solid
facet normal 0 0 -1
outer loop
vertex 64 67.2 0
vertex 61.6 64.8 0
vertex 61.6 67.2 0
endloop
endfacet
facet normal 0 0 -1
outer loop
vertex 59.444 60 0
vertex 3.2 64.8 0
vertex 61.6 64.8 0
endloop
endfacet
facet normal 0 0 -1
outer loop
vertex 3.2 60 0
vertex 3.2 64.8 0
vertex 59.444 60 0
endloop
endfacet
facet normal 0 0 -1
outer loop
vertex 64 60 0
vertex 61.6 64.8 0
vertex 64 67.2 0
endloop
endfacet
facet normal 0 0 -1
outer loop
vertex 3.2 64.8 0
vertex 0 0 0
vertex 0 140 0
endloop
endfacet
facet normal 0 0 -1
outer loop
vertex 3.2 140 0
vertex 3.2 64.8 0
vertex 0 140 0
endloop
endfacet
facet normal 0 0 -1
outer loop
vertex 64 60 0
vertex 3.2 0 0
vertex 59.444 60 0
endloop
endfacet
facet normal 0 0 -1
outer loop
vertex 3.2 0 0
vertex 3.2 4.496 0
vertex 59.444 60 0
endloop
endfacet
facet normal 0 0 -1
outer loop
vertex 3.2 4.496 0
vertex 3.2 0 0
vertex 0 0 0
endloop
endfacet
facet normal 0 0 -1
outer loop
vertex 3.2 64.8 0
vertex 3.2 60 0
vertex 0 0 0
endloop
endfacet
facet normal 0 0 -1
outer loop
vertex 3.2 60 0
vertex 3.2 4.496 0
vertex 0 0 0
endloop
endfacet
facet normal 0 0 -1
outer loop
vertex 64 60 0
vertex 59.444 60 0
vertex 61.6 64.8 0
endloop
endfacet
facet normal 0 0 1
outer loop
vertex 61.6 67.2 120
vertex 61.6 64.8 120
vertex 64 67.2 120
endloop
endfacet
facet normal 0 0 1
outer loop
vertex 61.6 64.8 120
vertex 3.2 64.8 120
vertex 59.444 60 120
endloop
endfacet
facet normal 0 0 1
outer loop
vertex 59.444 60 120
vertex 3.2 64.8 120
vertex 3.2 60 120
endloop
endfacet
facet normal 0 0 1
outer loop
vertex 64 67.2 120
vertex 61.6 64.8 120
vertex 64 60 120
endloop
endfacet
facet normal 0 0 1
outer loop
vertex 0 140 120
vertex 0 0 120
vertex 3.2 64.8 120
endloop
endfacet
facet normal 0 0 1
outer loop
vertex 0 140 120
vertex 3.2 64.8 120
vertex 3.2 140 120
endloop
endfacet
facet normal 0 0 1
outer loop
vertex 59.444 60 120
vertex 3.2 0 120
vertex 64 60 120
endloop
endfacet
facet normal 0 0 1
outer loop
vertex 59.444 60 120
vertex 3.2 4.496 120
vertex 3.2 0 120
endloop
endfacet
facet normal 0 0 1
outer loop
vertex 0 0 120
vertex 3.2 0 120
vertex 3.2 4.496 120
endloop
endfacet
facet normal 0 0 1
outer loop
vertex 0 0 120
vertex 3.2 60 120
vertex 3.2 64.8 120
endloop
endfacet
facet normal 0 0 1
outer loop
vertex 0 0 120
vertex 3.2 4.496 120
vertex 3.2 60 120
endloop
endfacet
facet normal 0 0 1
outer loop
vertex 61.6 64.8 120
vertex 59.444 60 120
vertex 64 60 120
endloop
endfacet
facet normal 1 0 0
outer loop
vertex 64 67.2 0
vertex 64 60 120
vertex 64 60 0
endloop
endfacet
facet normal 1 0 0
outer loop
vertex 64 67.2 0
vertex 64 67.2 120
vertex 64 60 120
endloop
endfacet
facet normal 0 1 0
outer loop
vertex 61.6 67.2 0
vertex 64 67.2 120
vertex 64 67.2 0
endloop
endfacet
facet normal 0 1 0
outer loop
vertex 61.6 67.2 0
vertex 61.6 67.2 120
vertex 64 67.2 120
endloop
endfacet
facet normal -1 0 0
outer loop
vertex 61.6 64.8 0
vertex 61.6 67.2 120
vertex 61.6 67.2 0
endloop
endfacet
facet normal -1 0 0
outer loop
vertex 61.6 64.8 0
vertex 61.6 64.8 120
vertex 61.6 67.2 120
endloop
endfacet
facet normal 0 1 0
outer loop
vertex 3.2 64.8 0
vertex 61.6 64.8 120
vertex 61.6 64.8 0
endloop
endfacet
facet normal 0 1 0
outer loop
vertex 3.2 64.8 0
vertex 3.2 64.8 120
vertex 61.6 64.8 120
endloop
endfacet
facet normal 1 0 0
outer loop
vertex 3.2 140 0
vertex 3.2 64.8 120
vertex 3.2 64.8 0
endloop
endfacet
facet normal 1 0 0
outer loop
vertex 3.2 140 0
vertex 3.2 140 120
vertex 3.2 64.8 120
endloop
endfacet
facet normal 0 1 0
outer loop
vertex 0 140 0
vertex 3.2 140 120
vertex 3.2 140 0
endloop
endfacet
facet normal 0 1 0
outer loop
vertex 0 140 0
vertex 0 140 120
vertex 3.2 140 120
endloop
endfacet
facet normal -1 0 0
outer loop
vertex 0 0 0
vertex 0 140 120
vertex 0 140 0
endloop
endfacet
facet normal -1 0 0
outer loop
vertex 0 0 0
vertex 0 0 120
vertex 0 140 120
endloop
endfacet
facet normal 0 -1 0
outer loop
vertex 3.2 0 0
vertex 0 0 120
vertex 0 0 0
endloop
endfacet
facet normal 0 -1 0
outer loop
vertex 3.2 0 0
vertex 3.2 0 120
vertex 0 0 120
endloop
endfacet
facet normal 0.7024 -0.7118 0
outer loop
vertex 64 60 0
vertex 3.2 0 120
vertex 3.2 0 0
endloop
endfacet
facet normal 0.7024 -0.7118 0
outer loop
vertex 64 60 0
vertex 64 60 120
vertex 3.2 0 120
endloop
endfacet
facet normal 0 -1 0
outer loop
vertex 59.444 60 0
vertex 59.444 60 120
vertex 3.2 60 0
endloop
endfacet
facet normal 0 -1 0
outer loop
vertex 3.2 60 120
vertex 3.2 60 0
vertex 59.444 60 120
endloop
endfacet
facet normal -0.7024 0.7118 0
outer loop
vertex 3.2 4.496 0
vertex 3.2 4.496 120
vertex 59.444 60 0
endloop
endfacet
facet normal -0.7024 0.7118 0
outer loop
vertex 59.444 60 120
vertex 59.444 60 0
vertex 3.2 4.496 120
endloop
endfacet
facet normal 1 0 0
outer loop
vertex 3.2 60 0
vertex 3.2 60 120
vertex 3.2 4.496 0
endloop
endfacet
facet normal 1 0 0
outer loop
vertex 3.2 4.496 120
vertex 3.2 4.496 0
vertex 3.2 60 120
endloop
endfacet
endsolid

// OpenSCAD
// Original prototype geometry. Units: mm. Modules output print orientation.
// Set part to an index below, render F6, then export STL. No structural rating.
part=0;
// Print as supplied, on its side. No supports intended; inspect sliced preview.
module part_01_ledge_core_SIDE_PRINT() { linear_extrude(height=120.0) polygon(points=[[3.2, 140.0], [3.2, 64.8], [61.6, 64.8], [61.6, 67.2], [64.0, 67.2], [64.0, 64.8], [64.0, 64.7], [64.0, 60.0], [3.2, 0.0], [0.0, 0.0], [0.0, 140.0], [3.2, 60.0], [3.2, 4.4958], [59.4442, 60.0]], paths=[[0, 1, 2, 3, 4, 5, 6, 7, 8, 9, 10], [11, 12, 13]]); }
// Print as supplied, on its side. No supports intended; inspect sliced preview.
module part_02_pixel_cubby_core_SIDE_PRINT() { linear_extrude(height=120.0) polygon(points=[[3.2, 64.8], [61.6, 64.8], [61.6, 67.2], [64.0, 67.2], [64.0, 64.8], [64.0, 64.7], [64.0, 60.0], [3.2, 0.0], [0.0, 0.0], [0.0, 175.2], [0.0, 180.0], [3.2, 180.0], [64.0, 180.0], [64.0, 175.2], [3.2, 175.2], [3.2, 4.4958], [59.4442, 60.0], [3.2, 60.0]], paths=[[0, 1, 2, 3, 4, 5, 6, 7, 8, 9, 10, 11, 12, 13, 14], [15, 16, 17]]); }
// Decorative only. Glue overlap to front of backplate; ribs face room.
module part_03_dragon_wing_R_FLAT() { mirror([0,1,0]) {linear_extrude(height=2.4) polygon(points=[[44.0, 42.0], [58.0, 72.0], [80.0, 48.0], [76.0, 93.0], [104.0, 66.0], [94.0, 118.0], [118.0, 95.0], [110.0, 144.0], [90.0, 172.0], [66.0, 186.0], [63.0, 178.0], [68.0, 160.0], [64.0, 144.0], [57.0, 133.0], [44.0, 128.0]], paths=[[0, 1, 2, 3, 4, 5, 6, 7, 8, 9, 10, 11, 12, 13, 14]]);translate([0,0,2.3]) linear_extrude(height=1) union() {polygon(points=[[58.7367, 71.9362], [58.3686, 72.3379], [58.3337, 72.3724], [58.2956, 72.4033], [58.2547, 72.4303], [58.2113, 72.4532], [58.1658, 72.4717], [58.1188, 72.4857], [58.0707, 72.495], [58.0218, 72.4995], [57.9728, 72.4993], [57.924, 72.4942], [57.8759, 72.4844], [57.829, 72.4699], [57.7838, 72.4508], [57.7407, 72.4275], [57.7, 72.4], [57.6623, 72.3687], [57.6278, 72.3338], [57.5969, 72.2958], [57.5698, 72.2548], [57.5469, 72.2114], [57.4697, 72.0459], [56.9041, 72.0948], [62.8959, 141.3337], [64.4218, 143.7316], [64.4481, 143.7783], [64.4693, 143.8275], [64.4851, 143.8787], [65.7687, 149.0134], [59.0959, 71.9052]], paths=[[0, 1, 2, 3, 4, 5, 6, 7, 8, 9, 10, 11, 12, 13, 14, 15, 16, 17, 18, 19, 20, 21, 22, 23, 24, 25, 26, 27, 28, 29, 30]]);polygon(points=[[65.9041, 176.0948], [68.0959, 175.9052], [67.1469, 164.9392], [65.4632, 171.0005]], paths=[[0, 1, 2, 3]]);}translate([0,0,2.3]) linear_extrude(height=1) polygon(points=[[67.8071, 157.1668], [68.4851, 159.8787], [68.495, 159.9293], [68.4996, 159.9807], [68.499, 160.0323], [68.493, 160.0835], [68.4818, 160.1338], [66.9432, 165.6726], [65.9056, 175.8889], [68.0944, 176.1111], [76.5153, 93.1977], [76.3471, 93.3599], [76.3106, 93.3919], [76.2711, 93.4201], [76.2291, 93.4444], [76.185, 93.4645], [76.1391, 93.4803], [76.0919, 93.4915], [76.0438, 93.4981], [75.9953, 93.5], [75.9469, 93.4972], [75.899, 93.4897], [75.852, 93.4776], [75.8064, 93.461], [75.7626, 93.4401], [75.7211, 93.415], [75.6822, 93.386], [75.6463, 93.3534], [75.6137, 93.3174], [75.5848, 93.2785], [75.5597, 93.237], [75.5388, 93.1932], [75.5223, 93.1476], [75.5102, 93.1006], [75.5028, 93.0526], [75.5, 93.0042], [75.502, 92.9557], [79.3713, 49.4258], [78.6721, 50.1886]], paths=[[0, 1, 2, 3, 4, 5, 6, 7, 8, 9, 10, 11, 12, 13, 14, 15, 16, 17, 18, 19, 20, 21, 22, 23, 24, 25, 26, 27, 28, 29, 30, 31, 32, 33, 34, 35, 36, 37, 38]]);translate([0,0,2.3]) linear_extrude(height=1) polygon(points=[[65.9574, 175.6493], [68.0426, 176.3507], [101.2618, 77.5908], [103.2109, 67.4555], [101.9365, 68.6844]], paths=[[0, 1, 2, 3, 4]]);translate([0,0,2.3]) linear_extrude(height=1) polygon(points=[[66.0691, 175.4139], [67.9309, 176.5861], [116.861, 98.8736], [117.2654, 96.3966], [113.6231, 99.8871]], paths=[[0, 1, 2, 3, 4]]);} }
// Decorative only. Glue overlap to front of backplate; ribs face room.
module part_03_dragon_wing_L_FLAT() { mirror([0,1,0]) {linear_extrude(height=2.4) polygon(points=[[-44.0, 42.0], [-58.0, 72.0], [-80.0, 48.0], [-76.0, 93.0], [-104.0, 66.0], [-94.0, 118.0], [-118.0, 95.0], [-110.0, 144.0], [-90.0, 172.0], [-66.0, 186.0], [-63.0, 178.0], [-68.0, 160.0], [-64.0, 144.0], [-57.0, 133.0], [-44.0, 128.0]], paths=[[0, 1, 2, 3, 4, 5, 6, 7, 8, 9, 10, 11, 12, 13, 14]]);translate([0,0,2.3]) linear_extrude(height=1) union() {polygon(points=[[-57.4697, 72.0459], [-57.5469, 72.2114], [-57.5698, 72.2548], [-57.5969, 72.2958], [-57.6278, 72.3338], [-57.6623, 72.3687], [-57.7, 72.4], [-57.7407, 72.4275], [-57.7838, 72.4508], [-57.829, 72.4699], [-57.8759, 72.4844], [-57.924, 72.4942], [-57.9728, 72.4993], [-58.0218, 72.4995], [-58.0707, 72.495], [-58.1188, 72.4857], [-58.1658, 72.4717], [-58.2113, 72.4532], [-58.2547, 72.4303], [-58.2956, 72.4033], [-58.3337, 72.3724], [-58.3686, 72.3379], [-58.7367, 71.9362], [-59.0959, 71.9052], [-65.7687, 149.0134], [-64.4851, 143.8787], [-64.4693, 143.8275], [-64.4481, 143.7783], [-64.4218, 143.7316], [-62.8959, 141.3337], [-56.9041, 72.0948]], paths=[[0, 1, 2, 3, 4, 5, 6, 7, 8, 9, 10, 11, 12, 13, 14, 15, 16, 17, 18, 19, 20, 21, 22, 23, 24, 25, 26, 27, 28, 29, 30]]);polygon(points=[[-68.0959, 175.9052], [-65.9041, 176.0948], [-65.4632, 171.0005], [-67.1469, 164.9392]], paths=[[0, 1, 2, 3]]);}translate([0,0,2.3]) linear_extrude(height=1) polygon(points=[[-68.0944, 176.1111], [-65.9056, 175.8889], [-66.9432, 165.6726], [-68.4818, 160.1338], [-68.493, 160.0835], [-68.499, 160.0323], [-68.4996, 159.9807], [-68.495, 159.9293], [-68.4851, 159.8787], [-67.8071, 157.1668], [-78.6721, 50.1886], [-79.3713, 49.4258], [-75.502, 92.9557], [-75.5, 93.0042], [-75.5028, 93.0526], [-75.5102, 93.1006], [-75.5223, 93.1476], [-75.5388, 93.1932], [-75.5597, 93.237], [-75.5848, 93.2785], [-75.6137, 93.3174], [-75.6463, 93.3534], [-75.6822, 93.386], [-75.7211, 93.415], [-75.7626, 93.4401], [-75.8064, 93.461], [-75.852, 93.4776], [-75.899, 93.4897], [-75.9469, 93.4972], [-75.9953, 93.5], [-76.0438, 93.4981], [-76.0919, 93.4915], [-76.1391, 93.4803], [-76.185, 93.4645], [-76.2291, 93.4444], [-76.2711, 93.4201], [-76.3106, 93.3919], [-76.3471, 93.3599], [-76.5153, 93.1977]], paths=[[0, 1, 2, 3, 4, 5, 6, 7, 8, 9, 10, 11, 12, 13, 14, 15, 16, 17, 18, 19, 20, 21, 22, 23, 24, 25, 26, 27, 28, 29, 30, 31, 32, 33, 34, 35, 36, 37, 38]]);translate([0,0,2.3]) linear_extrude(height=1) polygon(points=[[-68.0426, 176.3507], [-65.9574, 175.6493], [-101.9365, 68.6844], [-103.2109, 67.4555], [-101.2618, 77.5908]], paths=[[0, 1, 2, 3, 4]]);translate([0,0,2.3]) linear_extrude(height=1) polygon(points=[[-67.9309, 176.5861], [-66.0691, 175.4139], [-113.6231, 99.8871], [-117.2654, 96.3966], [-116.861, 98.8736]], paths=[[0, 1, 2, 3, 4]]);} }
// Optional decorative crest; glue to front centre of backplate.
module part_04_dragon_crest_FLAT() { mirror([0,1,0]) {linear_extrude(height=2.4) polygon(points=[[-17.0, 126.0], [0.0, 133.0], [17.0, 126.0], [15.0, 103.0], [0.0, 91.0], [-15.0, 103.0]], paths=[[0, 1, 2, 3, 4, 5]]); translate([0,0,2.3]) linear_extrude(height=1.2) polygon(points=[[-6.0, 122.0], [4.0, 126.0], [11.0, 120.0], [4.0, 117.0], [8.0, 111.0], [0.0, 102.0], [-2.0, 113.0], [-8.0, 116.0], [-2.0, 118.0]], paths=[[0, 1, 2, 3, 4, 5, 6, 7, 8]]);} }
// Decorative front frame. Align bottom at Z=55 and glue to lip/top front edges.
module part_05_pixel_frame_FLAT() { mirror([0,1,0]) {linear_extrude(height=2.4) polygon(points=[[-72.0, 79.0], [-66.0, 79.0], [-66.0, 169.0], [-78.0, 169.0], [-78.0, 187.0], [-60.0, 187.0], [-60.0, 199.0], [-36.0, 199.0], [-36.0, 187.0], [36.0, 187.0], [36.0, 199.0], [60.0, 199.0], [60.0, 187.0], [78.0, 187.0], [78.0, 169.0], [66.0, 169.0], [66.0, 79.0], [72.0, 79.0], [72.0, 55.0], [-72.0, 55.0], [54.0, 174.0], [-54.0, 174.0], [-54.0, 68.0], [54.0, 68.0]], paths=[[0, 1, 2, 3, 4, 5, 6, 7, 8, 9, 10, 11, 12, 13, 14, 15, 16, 17, 18, 19], [20, 21, 22, 23]]);} }
// Print first to check strip fit and finish. A bond trial does not validate a shelf load.
module part_00_adhesive_surface_coupon_SIDE_PRINT() { cube([3.2,110,30]); }
if(part==0) part_01_ledge_core_SIDE_PRINT();
if(part==1) part_02_pixel_cubby_core_SIDE_PRINT();
if(part==2) part_03_dragon_wing_R_FLAT();
if(part==3) part_03_dragon_wing_L_FLAT();
if(part==4) part_04_dragon_crest_FLAT();
if(part==5) part_05_pixel_frame_FLAT();
if(part==6) part_00_adhesive_surface_coupon_SIDE_PRINT();
